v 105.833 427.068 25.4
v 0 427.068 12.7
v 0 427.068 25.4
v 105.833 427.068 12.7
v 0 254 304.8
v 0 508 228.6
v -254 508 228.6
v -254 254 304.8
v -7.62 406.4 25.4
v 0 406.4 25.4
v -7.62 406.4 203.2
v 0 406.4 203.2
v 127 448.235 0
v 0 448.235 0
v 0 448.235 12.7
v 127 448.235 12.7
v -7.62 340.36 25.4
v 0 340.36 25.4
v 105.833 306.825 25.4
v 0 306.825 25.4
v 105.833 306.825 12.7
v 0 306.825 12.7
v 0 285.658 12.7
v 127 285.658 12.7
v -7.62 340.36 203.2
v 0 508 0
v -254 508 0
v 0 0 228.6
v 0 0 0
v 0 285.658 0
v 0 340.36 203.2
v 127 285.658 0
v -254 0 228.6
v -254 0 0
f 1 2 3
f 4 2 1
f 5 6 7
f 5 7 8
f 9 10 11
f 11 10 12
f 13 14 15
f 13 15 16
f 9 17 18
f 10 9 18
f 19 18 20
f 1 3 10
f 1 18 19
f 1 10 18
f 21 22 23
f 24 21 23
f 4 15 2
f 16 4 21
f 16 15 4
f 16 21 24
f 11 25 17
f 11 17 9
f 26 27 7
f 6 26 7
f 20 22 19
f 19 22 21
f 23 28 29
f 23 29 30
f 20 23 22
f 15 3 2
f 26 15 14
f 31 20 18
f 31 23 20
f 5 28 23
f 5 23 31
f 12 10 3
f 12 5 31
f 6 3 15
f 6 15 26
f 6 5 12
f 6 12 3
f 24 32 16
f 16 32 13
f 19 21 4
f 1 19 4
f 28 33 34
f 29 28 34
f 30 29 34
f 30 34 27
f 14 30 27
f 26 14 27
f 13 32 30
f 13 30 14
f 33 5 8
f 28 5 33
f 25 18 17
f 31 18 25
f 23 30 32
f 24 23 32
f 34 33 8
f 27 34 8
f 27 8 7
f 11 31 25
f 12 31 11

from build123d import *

# Parameters (mm, degrees)
F2_W     = 127
F2_H     = 162.576706
F3_DEPTH = 12.7
F4_W     = 105.833333
F4_H     = 120.243372
F5_DEPTH = 12.7
F6_DEPTH = 254
F1_W     = 66.04
F1_H     = 177.8
F7_DEPTH = 7.62


with BuildPart() as f3:
    # F2 (on Top) → F3 (new body)
    with BuildSketch(Plane.XY):
        with Locations((63.5, 366.946444)):
            Rectangle(F2_W, F2_H)
    extrude(amount=F3_DEPTH)

    # F4 (on face) → F5 (join)
    with BuildSketch(Plane.XY.offset(12.7)):
        with Locations((52.916666, 366.946444)):
            Rectangle(F4_W, F4_H)
    extrude(amount=F5_DEPTH)

    # F0 (on Right) → F6 (join)
    with BuildSketch(Plane.YZ):
        Polygon((0, 228.6), (0, 0), (508, 0), (508, 228.6), (254, 304.8), align=None)
    extrude(amount=-F6_DEPTH)

    # F1 (on Right) → F7 (cut)
    with BuildSketch(Plane.YZ):
        with Locations((373.38, 114.3)):
            Rectangle(F1_W, F1_H)
    extrude(amount=-F7_DEPTH, mode=Mode.SUBTRACT)


solid = f3.part
